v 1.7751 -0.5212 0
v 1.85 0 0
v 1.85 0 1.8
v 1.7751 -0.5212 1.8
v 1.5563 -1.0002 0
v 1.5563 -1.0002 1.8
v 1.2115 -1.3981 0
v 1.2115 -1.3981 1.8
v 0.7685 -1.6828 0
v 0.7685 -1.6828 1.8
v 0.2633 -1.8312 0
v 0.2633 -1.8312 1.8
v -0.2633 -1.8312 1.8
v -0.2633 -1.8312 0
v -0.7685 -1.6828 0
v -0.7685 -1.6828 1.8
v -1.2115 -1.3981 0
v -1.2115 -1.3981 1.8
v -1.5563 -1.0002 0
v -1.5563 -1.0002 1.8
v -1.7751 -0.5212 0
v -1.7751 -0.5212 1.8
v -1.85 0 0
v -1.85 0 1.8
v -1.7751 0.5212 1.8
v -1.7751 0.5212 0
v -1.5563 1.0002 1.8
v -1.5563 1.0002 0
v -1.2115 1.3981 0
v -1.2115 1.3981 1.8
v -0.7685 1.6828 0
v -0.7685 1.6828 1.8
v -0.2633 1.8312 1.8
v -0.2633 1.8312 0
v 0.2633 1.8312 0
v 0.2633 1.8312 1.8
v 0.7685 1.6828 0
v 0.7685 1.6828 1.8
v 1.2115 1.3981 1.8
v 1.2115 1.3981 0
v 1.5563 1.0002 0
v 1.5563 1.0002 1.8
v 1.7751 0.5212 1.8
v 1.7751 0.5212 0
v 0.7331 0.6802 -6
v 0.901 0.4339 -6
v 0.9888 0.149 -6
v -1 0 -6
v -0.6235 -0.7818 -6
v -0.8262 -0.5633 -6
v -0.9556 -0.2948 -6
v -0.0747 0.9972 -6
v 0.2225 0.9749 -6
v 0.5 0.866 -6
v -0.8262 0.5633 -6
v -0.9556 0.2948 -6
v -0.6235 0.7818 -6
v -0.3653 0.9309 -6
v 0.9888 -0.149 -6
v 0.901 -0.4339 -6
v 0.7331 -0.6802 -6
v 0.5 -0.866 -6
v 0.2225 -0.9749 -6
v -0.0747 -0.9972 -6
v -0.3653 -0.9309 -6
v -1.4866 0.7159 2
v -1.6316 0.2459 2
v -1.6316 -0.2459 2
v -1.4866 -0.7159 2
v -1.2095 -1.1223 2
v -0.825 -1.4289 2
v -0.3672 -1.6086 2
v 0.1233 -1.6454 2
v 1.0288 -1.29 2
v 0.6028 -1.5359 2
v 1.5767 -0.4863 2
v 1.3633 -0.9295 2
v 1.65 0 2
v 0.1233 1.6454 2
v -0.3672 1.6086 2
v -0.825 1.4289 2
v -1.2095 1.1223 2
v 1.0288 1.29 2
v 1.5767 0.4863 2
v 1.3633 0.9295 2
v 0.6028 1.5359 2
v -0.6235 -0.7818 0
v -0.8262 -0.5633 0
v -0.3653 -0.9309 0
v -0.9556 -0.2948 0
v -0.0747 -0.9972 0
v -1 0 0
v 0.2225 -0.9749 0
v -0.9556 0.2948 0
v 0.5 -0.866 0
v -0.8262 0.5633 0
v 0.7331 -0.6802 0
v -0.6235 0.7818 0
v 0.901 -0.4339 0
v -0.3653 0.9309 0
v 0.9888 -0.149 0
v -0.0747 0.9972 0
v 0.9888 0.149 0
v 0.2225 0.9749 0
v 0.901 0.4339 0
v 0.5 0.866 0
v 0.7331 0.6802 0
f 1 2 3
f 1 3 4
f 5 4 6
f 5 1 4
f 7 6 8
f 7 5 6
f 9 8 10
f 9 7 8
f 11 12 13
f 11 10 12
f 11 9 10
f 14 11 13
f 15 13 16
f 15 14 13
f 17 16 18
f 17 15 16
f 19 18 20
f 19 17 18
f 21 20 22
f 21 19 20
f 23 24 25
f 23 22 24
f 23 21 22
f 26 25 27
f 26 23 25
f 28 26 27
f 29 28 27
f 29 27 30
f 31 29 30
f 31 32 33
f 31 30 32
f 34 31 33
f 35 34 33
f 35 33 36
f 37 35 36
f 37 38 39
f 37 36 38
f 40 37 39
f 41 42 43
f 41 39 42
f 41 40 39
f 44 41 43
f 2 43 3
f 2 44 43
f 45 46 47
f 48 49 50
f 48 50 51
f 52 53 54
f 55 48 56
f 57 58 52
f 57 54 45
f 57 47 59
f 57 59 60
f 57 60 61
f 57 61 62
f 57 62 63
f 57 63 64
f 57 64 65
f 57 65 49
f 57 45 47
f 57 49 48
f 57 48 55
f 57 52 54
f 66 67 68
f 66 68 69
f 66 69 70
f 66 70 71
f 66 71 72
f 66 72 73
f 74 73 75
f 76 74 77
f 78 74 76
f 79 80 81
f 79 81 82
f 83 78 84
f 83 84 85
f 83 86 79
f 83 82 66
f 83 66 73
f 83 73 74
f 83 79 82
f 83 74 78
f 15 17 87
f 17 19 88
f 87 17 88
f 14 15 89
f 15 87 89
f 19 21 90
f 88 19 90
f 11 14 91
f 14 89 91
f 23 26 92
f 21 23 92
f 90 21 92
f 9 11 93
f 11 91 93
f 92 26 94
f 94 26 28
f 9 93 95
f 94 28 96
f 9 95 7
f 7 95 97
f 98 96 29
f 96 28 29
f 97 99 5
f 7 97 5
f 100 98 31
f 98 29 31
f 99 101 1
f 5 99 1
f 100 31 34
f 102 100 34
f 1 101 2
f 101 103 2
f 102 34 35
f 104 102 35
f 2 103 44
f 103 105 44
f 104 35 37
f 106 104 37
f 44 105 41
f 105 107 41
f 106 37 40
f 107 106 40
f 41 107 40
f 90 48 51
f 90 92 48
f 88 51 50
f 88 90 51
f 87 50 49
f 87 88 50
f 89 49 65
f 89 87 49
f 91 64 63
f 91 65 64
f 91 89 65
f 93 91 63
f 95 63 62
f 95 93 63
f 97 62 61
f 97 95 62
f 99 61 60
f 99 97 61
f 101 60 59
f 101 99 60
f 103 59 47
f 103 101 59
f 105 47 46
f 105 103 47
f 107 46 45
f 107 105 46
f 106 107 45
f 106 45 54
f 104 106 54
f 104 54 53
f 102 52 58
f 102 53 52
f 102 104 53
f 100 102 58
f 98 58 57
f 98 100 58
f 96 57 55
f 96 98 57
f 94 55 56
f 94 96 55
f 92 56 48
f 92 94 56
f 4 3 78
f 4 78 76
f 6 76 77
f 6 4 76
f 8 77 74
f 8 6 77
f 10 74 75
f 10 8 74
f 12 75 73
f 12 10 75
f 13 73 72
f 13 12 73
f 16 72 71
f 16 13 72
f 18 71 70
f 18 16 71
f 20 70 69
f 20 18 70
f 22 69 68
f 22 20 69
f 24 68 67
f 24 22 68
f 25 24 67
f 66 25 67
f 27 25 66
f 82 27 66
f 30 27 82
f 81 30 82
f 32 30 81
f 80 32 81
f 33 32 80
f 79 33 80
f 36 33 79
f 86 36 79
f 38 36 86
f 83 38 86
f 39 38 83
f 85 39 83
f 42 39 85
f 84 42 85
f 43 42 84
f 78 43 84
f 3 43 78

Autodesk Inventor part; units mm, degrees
ref_plane "YZ Plane" through (0, 0, 0) normal (1, 0, 0) x (0, 1, 0)
ref_plane "XZ Plane" through (0, 0, 0) normal (0, 1, 0) x (-1, 0, 0)
ref_plane "XY Plane" through (0, 0, 0) normal (0, 0, 1) x (1, 0, 0)
sketch "スケッチ1" plane through (0, 0, 0) normal (0, 0, 1) x (1, 0, 0)
  circle A0 centre (0, 0) radius 1.85
  dimension "d0" = 3.7
extrude "押し出し1" add sketch "スケッチ1" along normal blind 2
sketch "スケッチ2" plane through (0, 0, 0) normal (0, 0, -1) x (-1, 0, 0)
  circle A0 centre (0, 0) radius 1
  dimension "d3" = 2
extrude "押し出し2" add sketch "スケッチ2" along normal blind 6
thread "ねじ1" size "M2x0.4" class "6g" standard "ANSI Metric M Profile" full length
chamfer "面取り1" distance 0.2 angle 45 1 edges at (-1.85, 0, 2)
properties part number "M2×6" material "ステンレス鋼"
